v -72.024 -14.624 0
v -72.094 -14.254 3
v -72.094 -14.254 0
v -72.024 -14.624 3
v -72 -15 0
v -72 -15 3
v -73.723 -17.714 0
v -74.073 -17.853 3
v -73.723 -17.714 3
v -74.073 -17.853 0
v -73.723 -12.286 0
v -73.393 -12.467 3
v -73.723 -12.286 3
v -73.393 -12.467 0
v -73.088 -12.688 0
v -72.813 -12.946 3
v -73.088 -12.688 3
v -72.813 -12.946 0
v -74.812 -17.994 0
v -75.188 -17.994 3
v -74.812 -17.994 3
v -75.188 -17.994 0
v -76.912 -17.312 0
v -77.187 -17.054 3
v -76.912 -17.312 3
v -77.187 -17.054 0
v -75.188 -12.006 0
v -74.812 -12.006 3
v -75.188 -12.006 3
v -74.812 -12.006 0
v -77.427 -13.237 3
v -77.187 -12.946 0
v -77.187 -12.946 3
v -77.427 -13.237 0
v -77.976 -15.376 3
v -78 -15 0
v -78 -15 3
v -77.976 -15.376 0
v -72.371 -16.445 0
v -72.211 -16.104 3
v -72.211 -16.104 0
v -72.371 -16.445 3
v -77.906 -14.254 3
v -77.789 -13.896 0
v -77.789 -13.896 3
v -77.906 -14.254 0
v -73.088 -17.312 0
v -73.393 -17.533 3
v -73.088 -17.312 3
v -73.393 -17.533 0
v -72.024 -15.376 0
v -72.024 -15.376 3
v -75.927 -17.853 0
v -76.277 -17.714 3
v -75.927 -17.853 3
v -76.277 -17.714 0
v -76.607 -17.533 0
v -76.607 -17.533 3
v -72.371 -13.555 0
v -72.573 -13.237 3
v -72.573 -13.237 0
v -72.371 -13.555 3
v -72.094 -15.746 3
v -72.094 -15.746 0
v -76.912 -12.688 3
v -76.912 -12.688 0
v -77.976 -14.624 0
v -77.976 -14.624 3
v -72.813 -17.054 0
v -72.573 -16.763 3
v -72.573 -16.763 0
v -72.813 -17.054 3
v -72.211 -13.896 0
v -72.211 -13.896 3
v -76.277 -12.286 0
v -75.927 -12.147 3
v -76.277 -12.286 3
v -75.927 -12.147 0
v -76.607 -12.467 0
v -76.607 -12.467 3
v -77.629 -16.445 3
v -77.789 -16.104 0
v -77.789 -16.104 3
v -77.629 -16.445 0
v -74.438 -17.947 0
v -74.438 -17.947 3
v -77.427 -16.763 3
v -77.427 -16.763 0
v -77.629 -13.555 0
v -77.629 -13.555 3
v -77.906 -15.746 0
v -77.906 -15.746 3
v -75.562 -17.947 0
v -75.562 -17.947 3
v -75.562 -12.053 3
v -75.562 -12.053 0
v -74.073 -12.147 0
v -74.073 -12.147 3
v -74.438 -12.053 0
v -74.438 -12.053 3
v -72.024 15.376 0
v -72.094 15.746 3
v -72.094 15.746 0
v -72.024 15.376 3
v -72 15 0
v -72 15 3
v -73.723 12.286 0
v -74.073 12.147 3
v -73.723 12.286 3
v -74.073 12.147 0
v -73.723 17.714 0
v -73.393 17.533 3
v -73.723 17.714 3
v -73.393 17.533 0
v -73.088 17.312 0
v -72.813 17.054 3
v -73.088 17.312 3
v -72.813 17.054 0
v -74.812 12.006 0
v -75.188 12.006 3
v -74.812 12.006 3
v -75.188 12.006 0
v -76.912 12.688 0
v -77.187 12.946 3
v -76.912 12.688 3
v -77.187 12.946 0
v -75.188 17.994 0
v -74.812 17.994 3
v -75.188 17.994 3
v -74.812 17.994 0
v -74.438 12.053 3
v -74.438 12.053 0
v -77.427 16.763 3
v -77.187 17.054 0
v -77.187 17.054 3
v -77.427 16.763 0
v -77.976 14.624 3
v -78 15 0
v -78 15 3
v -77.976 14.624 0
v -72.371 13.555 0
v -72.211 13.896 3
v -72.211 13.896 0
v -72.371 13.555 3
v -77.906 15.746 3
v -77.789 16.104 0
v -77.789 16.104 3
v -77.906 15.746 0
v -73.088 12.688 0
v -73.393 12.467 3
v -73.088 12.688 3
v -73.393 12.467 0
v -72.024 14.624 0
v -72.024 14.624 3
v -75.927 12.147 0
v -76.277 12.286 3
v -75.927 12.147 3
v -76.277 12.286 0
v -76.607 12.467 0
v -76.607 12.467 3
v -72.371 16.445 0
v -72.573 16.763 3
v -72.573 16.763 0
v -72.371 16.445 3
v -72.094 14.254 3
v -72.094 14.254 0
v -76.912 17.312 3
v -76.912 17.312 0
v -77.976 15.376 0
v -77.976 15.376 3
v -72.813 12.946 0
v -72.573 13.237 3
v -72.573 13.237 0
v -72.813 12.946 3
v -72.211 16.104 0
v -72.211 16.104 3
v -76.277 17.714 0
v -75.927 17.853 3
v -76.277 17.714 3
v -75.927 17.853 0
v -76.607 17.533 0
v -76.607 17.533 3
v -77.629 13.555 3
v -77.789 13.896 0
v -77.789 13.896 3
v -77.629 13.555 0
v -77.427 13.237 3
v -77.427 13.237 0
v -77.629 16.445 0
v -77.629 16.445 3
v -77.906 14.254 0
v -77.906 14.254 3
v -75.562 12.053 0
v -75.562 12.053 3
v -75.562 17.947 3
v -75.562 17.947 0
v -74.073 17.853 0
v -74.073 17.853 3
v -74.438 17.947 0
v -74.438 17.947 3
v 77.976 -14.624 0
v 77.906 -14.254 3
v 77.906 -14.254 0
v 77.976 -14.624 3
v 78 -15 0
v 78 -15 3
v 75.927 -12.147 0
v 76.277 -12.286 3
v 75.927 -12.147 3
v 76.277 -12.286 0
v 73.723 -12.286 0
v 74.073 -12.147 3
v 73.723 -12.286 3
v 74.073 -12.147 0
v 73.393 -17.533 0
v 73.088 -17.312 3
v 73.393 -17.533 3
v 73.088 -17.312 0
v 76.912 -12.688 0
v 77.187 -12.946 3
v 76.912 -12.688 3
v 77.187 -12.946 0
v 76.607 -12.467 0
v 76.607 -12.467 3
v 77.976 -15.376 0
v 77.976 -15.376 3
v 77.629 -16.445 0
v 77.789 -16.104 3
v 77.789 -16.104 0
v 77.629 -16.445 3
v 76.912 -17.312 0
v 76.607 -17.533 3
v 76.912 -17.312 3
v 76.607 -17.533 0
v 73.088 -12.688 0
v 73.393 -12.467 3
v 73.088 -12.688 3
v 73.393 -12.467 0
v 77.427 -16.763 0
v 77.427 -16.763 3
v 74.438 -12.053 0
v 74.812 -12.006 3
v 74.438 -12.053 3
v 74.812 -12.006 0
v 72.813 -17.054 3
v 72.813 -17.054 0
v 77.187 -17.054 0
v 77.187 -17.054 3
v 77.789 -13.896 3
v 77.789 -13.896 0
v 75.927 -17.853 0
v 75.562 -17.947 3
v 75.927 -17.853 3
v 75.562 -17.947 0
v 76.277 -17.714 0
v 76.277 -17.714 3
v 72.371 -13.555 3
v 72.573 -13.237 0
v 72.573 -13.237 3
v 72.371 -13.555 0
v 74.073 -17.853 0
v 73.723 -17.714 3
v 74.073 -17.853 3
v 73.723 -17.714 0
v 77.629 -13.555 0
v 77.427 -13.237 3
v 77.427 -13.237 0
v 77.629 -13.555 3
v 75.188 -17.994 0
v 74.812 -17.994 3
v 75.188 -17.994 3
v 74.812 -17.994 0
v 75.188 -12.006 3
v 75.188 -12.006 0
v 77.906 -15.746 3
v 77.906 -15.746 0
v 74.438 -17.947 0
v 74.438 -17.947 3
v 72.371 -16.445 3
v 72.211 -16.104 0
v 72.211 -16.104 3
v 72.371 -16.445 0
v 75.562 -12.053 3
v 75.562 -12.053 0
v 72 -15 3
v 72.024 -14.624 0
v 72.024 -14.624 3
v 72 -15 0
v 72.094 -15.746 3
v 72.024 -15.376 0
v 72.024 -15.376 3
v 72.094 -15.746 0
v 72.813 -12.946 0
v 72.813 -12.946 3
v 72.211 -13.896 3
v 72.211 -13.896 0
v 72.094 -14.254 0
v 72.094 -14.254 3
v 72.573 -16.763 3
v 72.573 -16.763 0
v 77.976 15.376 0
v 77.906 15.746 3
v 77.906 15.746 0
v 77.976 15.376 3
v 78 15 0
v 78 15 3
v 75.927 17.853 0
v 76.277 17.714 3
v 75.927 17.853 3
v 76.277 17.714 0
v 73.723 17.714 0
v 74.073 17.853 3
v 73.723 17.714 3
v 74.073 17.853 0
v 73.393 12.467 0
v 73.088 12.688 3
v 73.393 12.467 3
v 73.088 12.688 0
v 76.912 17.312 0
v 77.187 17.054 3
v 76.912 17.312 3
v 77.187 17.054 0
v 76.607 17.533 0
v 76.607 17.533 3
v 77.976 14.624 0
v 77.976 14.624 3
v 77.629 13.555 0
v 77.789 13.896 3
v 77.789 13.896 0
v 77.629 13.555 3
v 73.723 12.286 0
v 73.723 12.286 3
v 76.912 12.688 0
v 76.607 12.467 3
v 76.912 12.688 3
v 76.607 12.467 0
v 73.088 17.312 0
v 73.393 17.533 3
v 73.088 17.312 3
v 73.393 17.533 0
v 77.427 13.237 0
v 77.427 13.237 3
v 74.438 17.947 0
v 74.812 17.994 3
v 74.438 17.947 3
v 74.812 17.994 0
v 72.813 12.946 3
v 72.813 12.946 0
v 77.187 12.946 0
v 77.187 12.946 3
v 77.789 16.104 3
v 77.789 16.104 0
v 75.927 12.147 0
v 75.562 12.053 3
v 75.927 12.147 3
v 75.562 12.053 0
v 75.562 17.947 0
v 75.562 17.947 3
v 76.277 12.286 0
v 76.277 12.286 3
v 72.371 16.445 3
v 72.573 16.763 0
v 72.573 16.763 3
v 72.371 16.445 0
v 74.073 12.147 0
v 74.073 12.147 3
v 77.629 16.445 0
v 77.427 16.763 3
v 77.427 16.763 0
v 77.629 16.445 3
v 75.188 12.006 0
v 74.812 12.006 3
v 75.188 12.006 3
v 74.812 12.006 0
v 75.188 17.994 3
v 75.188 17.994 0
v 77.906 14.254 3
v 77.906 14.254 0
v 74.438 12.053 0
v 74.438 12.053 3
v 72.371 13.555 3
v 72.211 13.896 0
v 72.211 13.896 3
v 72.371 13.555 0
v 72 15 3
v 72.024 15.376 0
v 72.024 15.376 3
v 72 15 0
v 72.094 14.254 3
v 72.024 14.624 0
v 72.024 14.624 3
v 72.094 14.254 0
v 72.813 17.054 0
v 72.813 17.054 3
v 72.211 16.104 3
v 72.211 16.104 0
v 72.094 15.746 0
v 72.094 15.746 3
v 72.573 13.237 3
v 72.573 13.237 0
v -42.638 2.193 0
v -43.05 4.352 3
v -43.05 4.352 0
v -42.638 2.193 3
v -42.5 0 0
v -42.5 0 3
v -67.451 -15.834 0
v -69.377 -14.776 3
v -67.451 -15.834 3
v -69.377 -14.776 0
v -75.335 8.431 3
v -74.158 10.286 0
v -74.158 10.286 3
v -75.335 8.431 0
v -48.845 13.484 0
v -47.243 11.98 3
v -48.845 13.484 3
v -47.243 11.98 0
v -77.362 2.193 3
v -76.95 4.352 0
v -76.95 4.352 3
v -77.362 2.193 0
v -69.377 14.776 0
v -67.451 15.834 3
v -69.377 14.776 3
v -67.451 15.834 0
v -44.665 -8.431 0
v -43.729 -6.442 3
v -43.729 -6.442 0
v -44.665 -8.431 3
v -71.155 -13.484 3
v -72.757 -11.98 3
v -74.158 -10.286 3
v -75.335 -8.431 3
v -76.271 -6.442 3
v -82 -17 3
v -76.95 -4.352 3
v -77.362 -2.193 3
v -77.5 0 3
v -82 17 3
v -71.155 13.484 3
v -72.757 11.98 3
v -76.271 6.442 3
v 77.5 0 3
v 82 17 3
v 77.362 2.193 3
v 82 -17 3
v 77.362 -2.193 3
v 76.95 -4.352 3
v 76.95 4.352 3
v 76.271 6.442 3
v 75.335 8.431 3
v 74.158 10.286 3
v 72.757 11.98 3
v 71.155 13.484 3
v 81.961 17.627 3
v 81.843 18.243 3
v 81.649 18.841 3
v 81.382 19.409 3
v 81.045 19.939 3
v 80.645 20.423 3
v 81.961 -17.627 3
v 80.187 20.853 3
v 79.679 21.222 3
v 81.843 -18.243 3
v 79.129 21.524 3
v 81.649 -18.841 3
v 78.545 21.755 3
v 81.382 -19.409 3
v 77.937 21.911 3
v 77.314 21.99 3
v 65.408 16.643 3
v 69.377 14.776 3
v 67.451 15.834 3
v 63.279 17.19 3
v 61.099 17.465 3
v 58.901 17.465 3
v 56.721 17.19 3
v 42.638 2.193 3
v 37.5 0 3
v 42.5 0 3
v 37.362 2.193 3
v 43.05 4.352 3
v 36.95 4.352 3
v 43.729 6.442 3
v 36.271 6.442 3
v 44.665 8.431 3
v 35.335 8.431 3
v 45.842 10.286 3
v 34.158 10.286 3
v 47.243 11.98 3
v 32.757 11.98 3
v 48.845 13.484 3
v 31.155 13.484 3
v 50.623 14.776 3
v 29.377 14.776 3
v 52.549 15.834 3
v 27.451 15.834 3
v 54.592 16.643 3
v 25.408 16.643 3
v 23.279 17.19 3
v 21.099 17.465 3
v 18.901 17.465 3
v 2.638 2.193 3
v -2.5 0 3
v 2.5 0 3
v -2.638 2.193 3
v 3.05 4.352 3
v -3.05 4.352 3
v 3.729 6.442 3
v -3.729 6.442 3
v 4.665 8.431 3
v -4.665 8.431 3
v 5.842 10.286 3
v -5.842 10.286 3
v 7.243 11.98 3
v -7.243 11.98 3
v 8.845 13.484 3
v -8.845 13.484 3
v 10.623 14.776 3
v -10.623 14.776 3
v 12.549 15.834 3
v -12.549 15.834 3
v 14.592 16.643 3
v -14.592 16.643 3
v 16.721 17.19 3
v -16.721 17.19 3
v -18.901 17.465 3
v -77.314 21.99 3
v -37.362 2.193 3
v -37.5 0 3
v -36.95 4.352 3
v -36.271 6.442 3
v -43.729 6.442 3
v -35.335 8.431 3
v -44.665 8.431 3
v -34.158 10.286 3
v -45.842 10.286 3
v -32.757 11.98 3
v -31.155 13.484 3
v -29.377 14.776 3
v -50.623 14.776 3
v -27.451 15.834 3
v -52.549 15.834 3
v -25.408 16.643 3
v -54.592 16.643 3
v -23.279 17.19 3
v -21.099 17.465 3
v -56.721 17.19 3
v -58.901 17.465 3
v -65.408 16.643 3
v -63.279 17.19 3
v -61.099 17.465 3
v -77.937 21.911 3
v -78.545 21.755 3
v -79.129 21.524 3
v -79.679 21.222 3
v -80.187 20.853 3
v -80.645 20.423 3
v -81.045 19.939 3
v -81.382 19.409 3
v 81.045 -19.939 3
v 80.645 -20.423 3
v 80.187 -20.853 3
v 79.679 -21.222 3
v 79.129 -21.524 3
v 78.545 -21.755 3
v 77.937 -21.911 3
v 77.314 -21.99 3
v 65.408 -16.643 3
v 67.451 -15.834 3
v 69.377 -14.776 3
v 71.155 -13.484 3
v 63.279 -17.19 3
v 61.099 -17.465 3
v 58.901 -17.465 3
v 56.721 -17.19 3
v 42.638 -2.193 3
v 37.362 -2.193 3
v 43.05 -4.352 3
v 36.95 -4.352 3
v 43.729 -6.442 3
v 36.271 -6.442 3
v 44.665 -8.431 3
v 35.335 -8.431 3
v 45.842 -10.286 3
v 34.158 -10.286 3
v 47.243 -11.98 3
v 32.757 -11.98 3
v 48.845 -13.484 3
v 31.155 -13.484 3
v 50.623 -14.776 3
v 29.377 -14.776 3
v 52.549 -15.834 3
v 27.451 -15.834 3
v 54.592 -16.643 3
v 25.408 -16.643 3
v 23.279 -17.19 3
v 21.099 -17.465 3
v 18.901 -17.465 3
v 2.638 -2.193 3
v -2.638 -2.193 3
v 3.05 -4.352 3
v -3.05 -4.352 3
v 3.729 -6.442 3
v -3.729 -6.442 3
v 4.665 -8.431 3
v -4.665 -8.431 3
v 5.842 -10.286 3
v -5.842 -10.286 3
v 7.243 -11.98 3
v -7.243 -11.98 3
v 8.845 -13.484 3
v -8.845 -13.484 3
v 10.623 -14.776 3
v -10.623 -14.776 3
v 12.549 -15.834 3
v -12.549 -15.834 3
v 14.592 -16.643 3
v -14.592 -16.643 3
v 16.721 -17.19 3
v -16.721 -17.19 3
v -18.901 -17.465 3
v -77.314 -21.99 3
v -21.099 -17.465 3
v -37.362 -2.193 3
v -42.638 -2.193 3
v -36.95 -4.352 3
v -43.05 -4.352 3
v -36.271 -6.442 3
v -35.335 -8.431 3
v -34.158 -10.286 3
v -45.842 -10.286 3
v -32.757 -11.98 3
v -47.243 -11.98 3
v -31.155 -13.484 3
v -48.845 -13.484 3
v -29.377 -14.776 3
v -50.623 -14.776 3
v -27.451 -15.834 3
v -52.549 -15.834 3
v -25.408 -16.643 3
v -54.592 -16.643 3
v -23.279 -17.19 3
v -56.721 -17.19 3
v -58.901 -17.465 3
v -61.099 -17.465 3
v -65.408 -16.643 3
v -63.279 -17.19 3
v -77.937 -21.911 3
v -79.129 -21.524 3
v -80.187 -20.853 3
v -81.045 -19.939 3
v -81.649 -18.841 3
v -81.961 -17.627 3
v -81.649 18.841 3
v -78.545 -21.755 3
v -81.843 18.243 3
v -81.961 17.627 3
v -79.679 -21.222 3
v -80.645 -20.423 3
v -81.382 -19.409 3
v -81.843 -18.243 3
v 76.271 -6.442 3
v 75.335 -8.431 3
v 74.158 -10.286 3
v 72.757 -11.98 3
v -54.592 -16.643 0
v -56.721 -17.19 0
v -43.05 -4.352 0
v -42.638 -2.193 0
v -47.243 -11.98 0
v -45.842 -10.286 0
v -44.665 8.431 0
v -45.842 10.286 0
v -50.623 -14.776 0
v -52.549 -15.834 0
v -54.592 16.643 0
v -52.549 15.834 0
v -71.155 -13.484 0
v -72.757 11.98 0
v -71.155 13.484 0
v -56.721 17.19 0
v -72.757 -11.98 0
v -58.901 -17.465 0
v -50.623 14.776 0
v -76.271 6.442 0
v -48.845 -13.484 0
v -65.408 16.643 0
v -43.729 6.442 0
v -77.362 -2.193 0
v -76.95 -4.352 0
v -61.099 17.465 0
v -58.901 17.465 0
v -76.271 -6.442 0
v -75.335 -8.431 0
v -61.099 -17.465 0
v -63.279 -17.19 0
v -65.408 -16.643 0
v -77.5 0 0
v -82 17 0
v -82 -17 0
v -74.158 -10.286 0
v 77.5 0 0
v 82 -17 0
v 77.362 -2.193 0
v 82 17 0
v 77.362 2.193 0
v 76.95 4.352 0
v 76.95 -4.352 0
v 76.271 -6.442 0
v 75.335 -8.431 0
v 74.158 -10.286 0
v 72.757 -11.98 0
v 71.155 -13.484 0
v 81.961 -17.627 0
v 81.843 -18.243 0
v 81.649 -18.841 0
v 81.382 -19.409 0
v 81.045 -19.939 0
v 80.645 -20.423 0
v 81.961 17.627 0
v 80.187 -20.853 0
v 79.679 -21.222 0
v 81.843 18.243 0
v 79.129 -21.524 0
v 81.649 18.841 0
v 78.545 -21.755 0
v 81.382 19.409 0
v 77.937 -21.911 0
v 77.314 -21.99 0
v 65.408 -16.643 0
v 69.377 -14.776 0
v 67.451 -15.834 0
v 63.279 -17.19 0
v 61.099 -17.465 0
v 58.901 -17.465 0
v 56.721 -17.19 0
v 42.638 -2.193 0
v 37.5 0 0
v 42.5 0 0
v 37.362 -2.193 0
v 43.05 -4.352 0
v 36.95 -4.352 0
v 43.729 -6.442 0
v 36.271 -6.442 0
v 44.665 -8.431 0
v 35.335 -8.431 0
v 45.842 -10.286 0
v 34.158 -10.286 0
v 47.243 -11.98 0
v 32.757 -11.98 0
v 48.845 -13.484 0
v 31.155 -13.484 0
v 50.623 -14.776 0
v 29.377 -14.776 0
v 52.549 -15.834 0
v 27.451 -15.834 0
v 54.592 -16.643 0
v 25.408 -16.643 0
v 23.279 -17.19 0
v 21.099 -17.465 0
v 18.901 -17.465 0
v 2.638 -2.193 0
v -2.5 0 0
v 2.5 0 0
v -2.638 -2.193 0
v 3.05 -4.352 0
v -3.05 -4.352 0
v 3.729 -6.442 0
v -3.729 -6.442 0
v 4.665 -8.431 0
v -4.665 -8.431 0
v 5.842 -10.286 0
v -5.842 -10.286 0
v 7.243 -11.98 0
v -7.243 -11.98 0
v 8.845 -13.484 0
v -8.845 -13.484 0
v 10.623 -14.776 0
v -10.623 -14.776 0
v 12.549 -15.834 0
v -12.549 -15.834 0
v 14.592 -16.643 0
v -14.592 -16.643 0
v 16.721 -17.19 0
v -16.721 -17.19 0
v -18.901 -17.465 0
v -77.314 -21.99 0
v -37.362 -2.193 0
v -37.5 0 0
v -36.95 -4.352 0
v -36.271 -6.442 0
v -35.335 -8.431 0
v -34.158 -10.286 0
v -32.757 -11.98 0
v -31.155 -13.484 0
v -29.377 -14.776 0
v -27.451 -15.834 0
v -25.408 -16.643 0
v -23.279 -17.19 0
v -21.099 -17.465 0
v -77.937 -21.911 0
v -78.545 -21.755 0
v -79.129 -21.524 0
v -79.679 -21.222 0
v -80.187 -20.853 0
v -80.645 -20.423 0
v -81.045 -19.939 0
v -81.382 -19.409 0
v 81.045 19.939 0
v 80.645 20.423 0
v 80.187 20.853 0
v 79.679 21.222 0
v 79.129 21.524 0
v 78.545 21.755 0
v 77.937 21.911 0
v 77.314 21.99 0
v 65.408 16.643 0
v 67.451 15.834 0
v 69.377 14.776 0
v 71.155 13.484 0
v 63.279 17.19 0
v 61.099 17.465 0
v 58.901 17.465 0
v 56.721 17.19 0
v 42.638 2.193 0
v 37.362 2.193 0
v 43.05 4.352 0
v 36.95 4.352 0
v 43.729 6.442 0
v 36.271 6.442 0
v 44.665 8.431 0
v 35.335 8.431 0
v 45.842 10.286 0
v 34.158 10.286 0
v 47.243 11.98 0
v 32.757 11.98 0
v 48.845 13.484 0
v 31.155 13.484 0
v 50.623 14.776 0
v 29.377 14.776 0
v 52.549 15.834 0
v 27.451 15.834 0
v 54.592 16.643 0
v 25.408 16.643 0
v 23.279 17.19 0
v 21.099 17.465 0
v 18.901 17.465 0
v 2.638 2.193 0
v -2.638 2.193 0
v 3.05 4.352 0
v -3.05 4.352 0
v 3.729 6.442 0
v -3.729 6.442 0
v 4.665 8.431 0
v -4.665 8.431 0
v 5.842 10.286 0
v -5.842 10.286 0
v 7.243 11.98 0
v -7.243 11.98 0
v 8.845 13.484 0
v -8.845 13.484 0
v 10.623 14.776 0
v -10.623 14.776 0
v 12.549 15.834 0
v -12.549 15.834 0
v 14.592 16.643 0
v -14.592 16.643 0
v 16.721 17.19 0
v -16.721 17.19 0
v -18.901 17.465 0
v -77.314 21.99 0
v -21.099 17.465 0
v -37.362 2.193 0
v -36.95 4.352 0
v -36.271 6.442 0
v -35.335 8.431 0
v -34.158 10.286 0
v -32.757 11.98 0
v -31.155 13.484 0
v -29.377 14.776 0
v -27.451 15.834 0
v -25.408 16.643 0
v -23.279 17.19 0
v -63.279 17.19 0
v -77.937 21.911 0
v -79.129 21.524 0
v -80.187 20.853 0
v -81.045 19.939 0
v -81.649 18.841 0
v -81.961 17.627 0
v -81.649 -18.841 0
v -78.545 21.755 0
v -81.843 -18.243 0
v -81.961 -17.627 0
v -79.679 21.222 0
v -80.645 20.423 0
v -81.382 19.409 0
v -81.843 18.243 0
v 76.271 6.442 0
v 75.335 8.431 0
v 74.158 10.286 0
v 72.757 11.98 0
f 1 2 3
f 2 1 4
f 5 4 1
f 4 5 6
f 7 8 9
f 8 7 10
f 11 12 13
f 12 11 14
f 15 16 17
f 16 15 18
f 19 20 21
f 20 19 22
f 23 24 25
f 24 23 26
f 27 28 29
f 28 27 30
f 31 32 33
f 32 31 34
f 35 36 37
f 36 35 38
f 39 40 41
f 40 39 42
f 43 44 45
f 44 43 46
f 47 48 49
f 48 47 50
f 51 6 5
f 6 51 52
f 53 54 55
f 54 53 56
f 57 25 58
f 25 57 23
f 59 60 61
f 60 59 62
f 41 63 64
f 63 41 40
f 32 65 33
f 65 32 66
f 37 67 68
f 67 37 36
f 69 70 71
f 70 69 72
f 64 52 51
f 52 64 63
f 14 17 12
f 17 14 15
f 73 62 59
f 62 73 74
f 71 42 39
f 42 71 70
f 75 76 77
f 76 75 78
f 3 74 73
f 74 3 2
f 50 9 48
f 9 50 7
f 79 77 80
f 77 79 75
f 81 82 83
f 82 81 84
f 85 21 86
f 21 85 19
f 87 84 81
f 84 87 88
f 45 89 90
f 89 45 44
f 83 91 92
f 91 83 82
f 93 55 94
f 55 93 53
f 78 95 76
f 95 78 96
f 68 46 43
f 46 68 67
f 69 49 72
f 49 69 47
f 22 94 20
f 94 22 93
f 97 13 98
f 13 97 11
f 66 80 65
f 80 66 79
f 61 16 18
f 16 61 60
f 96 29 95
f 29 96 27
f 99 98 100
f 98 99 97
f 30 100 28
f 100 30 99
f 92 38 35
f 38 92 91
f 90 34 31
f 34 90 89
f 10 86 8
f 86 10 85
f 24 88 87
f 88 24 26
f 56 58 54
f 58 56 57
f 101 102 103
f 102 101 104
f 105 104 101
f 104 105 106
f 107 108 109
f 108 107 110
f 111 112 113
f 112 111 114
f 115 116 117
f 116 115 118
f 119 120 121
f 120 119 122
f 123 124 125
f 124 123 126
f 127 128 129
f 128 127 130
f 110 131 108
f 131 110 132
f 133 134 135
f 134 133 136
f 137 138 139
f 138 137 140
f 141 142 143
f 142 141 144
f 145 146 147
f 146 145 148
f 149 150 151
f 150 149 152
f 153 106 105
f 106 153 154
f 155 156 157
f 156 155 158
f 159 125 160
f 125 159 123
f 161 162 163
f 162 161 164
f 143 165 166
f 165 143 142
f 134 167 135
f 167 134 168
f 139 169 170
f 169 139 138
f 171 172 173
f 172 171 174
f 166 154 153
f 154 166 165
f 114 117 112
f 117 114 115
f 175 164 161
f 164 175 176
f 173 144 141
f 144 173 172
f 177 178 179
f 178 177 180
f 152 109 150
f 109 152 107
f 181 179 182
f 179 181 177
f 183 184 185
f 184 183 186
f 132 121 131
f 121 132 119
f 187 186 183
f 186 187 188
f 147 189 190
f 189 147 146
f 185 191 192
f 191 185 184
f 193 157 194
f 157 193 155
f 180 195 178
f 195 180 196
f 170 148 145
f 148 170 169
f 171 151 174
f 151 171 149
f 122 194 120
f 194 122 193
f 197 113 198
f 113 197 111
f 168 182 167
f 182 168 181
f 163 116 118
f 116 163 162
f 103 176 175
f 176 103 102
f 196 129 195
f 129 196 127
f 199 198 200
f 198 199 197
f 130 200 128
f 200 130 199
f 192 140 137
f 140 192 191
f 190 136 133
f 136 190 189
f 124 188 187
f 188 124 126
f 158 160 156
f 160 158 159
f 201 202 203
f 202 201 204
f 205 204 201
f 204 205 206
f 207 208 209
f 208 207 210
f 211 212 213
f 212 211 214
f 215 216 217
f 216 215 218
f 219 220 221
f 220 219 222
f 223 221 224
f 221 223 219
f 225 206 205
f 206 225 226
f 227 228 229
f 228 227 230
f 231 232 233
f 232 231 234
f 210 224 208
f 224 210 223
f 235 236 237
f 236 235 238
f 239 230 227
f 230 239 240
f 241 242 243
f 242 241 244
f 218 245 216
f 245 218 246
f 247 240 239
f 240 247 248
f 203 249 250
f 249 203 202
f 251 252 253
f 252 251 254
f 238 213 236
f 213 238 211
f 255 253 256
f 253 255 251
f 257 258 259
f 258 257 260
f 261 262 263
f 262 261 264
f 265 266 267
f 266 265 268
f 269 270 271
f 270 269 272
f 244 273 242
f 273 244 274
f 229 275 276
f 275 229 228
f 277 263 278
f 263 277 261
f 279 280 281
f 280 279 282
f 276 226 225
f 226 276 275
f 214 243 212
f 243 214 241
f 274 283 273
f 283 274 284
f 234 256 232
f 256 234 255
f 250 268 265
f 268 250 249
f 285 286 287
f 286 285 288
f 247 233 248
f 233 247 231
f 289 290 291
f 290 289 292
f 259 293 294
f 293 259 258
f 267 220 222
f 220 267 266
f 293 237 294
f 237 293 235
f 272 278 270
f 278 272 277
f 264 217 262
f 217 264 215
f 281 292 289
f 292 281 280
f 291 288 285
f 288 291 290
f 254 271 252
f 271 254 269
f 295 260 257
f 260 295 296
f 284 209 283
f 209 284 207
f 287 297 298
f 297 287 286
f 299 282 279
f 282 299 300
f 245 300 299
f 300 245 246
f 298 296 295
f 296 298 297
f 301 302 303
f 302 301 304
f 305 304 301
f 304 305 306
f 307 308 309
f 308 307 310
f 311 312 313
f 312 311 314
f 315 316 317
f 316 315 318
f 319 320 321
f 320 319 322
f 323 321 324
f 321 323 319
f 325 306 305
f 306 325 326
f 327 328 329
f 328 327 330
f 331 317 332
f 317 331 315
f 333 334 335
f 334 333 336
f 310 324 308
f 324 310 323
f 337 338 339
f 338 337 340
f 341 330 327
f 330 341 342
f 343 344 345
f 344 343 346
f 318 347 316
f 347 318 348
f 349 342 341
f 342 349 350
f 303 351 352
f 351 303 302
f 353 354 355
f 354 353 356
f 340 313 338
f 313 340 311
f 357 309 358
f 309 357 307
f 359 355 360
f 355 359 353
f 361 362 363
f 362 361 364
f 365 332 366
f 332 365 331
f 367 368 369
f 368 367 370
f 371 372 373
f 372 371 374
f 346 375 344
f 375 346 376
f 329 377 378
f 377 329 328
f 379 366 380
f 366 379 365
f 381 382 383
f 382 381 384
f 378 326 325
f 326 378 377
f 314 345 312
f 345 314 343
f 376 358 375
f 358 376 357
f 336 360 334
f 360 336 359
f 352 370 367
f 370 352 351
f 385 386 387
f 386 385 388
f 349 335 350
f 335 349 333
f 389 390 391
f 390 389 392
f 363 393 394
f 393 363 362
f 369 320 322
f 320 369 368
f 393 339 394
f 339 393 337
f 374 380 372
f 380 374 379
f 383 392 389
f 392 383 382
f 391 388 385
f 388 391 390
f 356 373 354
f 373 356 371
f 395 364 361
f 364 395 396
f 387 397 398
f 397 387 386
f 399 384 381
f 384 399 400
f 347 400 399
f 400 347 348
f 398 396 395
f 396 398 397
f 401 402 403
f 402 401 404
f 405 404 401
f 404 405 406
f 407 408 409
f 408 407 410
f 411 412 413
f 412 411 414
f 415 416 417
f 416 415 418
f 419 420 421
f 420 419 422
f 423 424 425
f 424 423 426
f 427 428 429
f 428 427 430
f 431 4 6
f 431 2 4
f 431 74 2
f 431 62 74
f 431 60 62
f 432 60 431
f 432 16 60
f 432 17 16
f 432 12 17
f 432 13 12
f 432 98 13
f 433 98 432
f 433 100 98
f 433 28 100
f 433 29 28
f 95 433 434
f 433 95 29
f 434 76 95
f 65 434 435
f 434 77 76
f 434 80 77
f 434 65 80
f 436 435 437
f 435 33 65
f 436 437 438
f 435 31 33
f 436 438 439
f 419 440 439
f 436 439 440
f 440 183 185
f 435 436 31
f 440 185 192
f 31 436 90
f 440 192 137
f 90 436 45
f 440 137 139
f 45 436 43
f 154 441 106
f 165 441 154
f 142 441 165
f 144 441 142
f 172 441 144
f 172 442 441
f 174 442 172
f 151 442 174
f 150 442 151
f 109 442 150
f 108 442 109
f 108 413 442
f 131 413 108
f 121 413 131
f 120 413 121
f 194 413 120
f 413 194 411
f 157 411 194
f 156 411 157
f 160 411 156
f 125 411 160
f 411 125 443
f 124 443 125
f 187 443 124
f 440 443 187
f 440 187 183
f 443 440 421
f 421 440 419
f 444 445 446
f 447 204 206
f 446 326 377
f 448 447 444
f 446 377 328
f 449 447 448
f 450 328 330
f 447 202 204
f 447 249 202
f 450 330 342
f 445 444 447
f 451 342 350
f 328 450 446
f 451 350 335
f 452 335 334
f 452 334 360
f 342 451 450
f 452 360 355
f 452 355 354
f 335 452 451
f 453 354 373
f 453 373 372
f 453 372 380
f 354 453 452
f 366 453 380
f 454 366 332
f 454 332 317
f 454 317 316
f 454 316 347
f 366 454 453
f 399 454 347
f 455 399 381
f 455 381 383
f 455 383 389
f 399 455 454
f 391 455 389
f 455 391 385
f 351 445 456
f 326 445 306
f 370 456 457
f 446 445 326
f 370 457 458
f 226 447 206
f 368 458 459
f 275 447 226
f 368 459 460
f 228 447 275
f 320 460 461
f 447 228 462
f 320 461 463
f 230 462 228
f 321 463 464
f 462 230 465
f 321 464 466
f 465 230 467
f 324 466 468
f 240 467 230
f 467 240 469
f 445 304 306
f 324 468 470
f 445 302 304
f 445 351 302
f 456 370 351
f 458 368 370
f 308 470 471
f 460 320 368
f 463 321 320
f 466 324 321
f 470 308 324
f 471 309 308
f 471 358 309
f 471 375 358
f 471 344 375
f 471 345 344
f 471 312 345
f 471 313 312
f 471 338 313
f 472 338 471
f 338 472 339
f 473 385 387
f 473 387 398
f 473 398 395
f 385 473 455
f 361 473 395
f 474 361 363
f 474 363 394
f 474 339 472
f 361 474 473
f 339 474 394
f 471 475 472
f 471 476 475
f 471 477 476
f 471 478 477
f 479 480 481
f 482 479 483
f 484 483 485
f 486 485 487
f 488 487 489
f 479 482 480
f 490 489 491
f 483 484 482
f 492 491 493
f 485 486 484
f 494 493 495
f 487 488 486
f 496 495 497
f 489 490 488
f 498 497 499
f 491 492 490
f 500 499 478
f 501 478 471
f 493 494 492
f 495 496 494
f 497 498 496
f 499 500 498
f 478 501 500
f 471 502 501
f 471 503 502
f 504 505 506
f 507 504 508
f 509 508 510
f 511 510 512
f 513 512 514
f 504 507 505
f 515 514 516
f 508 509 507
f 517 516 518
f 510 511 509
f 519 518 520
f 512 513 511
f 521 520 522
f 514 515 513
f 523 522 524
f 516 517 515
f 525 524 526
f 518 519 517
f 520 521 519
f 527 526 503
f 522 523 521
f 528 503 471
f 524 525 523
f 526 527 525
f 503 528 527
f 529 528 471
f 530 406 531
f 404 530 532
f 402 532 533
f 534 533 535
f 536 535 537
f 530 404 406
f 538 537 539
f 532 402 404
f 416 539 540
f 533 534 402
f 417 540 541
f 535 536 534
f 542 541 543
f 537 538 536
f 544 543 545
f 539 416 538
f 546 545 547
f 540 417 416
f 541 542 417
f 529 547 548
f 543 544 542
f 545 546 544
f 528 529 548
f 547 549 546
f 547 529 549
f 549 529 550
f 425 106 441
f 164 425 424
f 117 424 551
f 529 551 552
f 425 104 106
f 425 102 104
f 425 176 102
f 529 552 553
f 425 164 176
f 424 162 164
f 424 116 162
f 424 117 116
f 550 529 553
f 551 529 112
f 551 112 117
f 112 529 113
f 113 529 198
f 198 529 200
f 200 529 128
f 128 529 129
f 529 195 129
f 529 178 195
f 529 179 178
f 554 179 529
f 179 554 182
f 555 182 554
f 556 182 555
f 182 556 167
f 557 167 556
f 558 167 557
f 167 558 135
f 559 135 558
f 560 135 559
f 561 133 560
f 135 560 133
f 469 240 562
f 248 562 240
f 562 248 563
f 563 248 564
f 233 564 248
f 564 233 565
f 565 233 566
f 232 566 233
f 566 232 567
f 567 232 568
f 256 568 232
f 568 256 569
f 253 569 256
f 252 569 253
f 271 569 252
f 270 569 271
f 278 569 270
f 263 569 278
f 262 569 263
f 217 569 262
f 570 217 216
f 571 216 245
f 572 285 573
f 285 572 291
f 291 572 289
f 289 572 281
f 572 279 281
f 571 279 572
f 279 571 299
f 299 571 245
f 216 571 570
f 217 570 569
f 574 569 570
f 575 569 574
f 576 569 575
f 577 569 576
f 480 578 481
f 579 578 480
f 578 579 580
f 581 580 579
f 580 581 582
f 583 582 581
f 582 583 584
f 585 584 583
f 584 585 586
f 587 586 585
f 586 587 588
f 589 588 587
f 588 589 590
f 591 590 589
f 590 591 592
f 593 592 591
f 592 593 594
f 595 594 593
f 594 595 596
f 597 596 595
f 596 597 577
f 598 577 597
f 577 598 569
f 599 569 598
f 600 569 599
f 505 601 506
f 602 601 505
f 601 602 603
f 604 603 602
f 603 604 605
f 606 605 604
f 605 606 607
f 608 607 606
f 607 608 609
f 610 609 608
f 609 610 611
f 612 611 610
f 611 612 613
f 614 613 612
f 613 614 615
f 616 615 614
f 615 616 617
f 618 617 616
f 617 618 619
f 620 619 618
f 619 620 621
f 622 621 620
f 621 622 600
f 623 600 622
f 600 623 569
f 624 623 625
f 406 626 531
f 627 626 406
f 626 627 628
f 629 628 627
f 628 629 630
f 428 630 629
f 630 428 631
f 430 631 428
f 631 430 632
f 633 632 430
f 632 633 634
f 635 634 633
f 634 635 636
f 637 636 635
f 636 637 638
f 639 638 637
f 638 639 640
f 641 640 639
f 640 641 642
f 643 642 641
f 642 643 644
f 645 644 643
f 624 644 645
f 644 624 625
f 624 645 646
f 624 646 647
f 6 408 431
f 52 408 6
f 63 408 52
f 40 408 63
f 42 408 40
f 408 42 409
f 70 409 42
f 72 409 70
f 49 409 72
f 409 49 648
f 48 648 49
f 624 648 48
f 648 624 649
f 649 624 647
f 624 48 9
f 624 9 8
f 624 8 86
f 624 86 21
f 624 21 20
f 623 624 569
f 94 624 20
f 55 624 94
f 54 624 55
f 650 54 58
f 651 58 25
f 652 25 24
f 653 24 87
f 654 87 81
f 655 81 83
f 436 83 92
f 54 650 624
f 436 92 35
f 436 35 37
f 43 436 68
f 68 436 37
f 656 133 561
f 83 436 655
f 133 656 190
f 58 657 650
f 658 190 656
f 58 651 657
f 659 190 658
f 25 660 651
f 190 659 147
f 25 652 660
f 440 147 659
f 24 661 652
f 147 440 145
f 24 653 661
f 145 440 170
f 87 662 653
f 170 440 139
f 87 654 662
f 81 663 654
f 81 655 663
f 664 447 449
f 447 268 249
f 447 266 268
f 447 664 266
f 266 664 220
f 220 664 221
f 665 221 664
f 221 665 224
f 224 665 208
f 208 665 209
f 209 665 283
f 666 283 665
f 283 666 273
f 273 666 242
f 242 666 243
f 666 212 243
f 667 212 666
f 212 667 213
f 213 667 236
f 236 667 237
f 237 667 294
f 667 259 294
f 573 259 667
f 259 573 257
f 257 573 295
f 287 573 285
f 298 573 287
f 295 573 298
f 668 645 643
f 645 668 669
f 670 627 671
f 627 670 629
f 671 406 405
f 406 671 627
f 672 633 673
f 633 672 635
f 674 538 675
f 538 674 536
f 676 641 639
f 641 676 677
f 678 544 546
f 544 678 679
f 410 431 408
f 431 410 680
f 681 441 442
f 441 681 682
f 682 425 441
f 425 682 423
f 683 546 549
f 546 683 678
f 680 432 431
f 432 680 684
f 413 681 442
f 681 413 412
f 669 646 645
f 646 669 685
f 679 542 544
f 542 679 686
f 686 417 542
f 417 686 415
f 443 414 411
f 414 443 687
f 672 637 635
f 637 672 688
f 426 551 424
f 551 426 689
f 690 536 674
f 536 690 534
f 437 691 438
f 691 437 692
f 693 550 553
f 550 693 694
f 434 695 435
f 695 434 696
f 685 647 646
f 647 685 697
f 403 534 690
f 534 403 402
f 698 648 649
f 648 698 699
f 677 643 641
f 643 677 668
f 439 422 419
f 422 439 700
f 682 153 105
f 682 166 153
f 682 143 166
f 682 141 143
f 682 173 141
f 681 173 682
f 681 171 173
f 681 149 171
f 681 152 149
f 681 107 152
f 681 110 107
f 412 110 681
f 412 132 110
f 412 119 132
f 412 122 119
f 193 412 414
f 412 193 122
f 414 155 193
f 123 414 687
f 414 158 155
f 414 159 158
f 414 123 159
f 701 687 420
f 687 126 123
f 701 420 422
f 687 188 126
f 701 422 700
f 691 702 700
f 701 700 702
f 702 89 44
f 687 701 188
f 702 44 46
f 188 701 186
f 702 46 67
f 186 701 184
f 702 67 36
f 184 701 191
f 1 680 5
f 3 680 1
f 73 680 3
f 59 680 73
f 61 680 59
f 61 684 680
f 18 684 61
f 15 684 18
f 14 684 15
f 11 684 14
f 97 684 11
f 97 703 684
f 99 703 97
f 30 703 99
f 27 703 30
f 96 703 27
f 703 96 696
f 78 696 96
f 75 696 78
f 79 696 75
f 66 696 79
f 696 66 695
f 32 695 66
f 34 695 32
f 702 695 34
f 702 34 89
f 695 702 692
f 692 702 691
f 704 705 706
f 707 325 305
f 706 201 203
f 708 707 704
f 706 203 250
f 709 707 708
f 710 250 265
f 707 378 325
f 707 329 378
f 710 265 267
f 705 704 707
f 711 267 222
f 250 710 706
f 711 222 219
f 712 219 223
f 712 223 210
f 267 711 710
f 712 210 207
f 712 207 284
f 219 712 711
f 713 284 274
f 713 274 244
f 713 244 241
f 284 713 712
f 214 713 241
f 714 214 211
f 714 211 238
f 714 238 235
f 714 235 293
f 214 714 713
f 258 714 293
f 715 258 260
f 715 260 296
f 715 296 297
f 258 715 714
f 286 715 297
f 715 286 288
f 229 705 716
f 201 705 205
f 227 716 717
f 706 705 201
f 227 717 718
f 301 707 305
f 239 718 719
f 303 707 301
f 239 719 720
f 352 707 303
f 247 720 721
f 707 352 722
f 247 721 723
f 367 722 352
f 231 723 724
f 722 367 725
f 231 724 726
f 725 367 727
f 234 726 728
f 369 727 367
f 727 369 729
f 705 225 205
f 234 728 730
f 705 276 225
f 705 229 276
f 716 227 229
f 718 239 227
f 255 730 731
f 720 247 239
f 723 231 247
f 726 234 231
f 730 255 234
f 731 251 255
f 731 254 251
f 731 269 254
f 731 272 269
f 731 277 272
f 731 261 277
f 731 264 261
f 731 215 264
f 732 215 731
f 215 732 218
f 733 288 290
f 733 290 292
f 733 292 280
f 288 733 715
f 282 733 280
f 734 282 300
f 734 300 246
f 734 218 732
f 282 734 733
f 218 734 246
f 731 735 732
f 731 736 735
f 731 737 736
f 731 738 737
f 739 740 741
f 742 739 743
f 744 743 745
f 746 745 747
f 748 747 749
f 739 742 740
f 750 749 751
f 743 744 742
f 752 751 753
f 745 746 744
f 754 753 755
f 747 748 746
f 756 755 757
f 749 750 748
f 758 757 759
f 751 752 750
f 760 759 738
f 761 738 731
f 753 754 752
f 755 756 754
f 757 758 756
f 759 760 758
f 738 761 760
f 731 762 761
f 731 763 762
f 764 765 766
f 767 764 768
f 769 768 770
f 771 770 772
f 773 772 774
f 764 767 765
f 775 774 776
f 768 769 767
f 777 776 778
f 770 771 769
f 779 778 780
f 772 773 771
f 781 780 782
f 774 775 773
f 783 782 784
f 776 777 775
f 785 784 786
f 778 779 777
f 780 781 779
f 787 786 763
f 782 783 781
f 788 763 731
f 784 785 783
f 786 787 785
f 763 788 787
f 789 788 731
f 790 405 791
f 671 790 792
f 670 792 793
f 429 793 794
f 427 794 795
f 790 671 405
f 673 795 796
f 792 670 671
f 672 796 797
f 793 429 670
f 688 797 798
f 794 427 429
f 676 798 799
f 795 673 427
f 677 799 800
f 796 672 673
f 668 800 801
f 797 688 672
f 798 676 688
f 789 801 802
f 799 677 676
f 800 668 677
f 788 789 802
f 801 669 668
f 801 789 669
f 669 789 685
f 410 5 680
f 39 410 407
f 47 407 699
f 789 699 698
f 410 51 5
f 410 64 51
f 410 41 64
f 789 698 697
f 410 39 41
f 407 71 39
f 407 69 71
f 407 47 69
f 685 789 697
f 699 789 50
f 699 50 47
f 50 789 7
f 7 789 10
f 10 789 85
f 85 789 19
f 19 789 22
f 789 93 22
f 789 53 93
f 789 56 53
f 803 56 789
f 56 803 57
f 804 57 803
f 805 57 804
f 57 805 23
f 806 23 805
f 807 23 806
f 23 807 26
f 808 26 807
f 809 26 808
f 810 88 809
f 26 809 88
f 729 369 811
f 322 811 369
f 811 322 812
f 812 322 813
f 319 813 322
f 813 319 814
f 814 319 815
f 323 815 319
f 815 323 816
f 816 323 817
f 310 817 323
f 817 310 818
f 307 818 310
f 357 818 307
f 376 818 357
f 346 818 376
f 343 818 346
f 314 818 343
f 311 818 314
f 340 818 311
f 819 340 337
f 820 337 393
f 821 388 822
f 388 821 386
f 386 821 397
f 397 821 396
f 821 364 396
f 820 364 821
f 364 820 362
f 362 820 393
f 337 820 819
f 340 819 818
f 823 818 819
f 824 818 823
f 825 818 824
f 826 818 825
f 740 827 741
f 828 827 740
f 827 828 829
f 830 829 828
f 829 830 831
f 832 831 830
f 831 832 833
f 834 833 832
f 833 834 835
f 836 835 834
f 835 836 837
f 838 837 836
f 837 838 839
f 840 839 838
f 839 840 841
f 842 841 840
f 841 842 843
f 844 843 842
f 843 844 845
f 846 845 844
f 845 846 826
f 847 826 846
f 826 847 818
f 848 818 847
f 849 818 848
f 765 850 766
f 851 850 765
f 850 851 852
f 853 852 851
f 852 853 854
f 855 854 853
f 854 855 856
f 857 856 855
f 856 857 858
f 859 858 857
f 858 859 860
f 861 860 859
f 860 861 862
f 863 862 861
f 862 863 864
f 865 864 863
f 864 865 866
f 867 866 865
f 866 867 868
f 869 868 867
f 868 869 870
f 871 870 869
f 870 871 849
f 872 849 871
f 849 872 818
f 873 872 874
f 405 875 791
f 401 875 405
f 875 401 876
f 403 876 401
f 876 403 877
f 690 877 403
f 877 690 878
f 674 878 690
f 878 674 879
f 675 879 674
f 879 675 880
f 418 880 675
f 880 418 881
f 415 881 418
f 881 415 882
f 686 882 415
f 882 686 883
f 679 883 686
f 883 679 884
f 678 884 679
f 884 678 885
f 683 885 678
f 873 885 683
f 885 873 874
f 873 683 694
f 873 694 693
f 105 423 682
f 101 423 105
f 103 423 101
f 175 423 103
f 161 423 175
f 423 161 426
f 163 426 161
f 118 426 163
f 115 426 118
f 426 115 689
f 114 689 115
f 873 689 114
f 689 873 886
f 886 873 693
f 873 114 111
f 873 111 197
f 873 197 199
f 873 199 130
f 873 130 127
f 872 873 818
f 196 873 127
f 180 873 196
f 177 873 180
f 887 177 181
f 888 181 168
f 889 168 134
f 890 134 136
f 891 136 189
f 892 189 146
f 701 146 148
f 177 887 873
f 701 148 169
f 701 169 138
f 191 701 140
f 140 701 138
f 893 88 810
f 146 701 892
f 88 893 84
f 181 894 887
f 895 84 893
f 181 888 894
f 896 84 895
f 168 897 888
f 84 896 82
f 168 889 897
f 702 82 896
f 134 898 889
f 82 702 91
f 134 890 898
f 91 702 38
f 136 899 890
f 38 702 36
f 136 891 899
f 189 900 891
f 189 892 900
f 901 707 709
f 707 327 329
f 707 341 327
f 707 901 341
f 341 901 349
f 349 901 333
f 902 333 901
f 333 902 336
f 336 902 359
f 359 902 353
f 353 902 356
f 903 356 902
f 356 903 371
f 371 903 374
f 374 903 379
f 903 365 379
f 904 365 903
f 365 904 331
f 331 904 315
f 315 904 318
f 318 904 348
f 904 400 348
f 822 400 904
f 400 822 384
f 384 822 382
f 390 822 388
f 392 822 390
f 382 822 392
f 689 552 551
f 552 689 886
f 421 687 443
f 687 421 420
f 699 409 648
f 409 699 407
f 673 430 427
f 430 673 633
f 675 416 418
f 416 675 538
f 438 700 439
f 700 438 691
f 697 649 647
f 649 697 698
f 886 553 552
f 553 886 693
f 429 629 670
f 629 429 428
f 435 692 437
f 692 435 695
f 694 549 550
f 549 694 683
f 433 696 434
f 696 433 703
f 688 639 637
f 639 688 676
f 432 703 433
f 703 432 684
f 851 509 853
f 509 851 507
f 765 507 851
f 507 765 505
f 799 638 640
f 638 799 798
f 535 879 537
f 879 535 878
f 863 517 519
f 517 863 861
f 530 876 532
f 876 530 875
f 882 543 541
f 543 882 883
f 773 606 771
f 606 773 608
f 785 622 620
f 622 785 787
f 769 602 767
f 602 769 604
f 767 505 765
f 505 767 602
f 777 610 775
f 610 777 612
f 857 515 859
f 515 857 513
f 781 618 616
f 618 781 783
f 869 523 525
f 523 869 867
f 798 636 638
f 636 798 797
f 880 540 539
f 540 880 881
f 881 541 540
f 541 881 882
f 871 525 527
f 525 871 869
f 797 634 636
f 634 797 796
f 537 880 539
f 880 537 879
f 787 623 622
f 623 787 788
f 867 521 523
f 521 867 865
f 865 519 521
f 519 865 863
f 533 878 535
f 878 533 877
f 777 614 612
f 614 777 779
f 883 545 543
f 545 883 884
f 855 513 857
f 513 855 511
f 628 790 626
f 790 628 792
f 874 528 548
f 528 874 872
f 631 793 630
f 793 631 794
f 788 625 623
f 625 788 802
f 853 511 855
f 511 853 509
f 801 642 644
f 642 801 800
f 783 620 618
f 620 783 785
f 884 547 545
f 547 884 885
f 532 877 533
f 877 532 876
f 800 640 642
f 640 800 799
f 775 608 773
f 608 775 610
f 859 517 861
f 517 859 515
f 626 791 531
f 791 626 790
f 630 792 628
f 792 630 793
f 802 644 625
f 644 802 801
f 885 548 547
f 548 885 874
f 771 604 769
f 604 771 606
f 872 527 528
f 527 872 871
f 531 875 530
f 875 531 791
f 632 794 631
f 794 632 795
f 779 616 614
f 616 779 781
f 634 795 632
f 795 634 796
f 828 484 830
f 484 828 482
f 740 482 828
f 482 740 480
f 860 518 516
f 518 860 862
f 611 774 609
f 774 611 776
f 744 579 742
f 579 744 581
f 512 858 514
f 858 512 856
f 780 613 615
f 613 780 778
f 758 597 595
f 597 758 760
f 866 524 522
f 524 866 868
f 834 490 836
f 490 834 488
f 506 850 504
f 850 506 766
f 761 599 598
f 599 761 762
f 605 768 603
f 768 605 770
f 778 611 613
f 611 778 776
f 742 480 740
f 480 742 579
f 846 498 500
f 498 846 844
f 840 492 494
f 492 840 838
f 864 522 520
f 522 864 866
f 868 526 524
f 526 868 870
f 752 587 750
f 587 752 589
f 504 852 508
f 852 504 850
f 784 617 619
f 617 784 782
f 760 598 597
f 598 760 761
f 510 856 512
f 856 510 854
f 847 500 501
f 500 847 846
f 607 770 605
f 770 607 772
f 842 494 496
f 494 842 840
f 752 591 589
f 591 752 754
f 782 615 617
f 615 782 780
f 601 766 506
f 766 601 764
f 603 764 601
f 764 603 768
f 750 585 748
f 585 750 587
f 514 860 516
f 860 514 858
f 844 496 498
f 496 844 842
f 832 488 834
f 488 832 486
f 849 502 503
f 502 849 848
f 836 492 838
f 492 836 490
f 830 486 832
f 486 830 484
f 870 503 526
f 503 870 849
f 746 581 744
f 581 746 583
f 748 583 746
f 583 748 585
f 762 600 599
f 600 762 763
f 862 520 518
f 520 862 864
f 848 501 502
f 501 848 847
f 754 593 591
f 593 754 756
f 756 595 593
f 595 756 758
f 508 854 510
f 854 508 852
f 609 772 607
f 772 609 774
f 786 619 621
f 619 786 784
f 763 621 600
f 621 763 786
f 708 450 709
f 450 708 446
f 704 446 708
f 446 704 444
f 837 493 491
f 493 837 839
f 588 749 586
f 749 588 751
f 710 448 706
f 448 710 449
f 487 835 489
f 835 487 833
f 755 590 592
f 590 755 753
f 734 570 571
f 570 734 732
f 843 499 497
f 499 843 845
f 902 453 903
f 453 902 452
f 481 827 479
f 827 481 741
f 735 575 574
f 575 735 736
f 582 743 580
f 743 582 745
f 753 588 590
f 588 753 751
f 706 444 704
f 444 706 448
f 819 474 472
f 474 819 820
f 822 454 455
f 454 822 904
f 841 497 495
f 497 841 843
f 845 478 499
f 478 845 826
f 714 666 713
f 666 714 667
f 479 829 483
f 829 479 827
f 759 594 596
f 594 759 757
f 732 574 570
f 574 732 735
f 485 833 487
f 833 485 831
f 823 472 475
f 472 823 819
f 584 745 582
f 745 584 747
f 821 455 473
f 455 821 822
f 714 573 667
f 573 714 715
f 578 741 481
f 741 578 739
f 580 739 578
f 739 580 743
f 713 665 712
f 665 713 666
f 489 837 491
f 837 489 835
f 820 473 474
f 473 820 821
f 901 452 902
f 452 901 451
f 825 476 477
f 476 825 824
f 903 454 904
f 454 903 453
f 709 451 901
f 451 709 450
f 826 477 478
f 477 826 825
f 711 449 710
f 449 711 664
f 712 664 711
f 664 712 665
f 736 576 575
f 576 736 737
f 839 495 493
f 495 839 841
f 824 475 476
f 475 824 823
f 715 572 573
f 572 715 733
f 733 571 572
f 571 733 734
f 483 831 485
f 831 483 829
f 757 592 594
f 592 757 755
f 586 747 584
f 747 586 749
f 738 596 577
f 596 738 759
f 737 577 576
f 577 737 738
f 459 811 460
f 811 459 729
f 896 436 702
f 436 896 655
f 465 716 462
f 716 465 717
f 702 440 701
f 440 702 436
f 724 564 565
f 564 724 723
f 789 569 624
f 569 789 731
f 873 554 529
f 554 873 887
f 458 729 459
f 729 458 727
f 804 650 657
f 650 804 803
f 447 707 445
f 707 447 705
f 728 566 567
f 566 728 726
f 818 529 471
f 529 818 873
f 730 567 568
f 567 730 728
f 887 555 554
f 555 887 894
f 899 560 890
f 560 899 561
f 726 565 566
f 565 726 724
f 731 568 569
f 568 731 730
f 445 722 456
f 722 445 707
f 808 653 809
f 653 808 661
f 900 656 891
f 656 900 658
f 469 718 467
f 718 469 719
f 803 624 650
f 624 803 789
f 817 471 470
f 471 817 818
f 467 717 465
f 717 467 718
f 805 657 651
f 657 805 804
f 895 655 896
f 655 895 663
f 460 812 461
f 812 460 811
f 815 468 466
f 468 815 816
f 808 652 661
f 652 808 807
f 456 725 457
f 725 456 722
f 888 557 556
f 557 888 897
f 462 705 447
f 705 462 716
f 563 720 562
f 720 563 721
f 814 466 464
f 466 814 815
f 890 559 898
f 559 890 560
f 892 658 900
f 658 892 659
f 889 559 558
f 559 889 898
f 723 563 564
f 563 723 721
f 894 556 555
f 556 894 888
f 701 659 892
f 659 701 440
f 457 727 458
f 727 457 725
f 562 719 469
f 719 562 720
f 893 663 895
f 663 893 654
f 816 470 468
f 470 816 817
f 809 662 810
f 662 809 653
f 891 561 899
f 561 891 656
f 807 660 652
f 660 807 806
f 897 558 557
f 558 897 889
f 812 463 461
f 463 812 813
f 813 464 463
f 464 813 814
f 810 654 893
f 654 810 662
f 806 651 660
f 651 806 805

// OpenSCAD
$fn = 50;


difference() {
	union() {
		hull() {
			translate(v = [-77.0000000000, 17.0000000000, 0]) {
				cylinder(h = 3, r = 5);
			}
			translate(v = [77.0000000000, 17.0000000000, 0]) {
				cylinder(h = 3, r = 5);
			}
			translate(v = [-77.0000000000, -17.0000000000, 0]) {
				cylinder(h = 3, r = 5);
			}
			translate(v = [77.0000000000, -17.0000000000, 0]) {
				cylinder(h = 3, r = 5);
			}
		}
	}
	union() {
		#translate(v = [-75.0000000000, -15.0000000000, -100.0000000000]) {
			cylinder(h = 200, r = 3.0000000000);
		}
		#translate(v = [-75.0000000000, 15.0000000000, -100.0000000000]) {
			cylinder(h = 200, r = 3.0000000000);
		}
		#translate(v = [75.0000000000, -15.0000000000, -100.0000000000]) {
			cylinder(h = 200, r = 3.0000000000);
		}
		#translate(v = [75.0000000000, 15.0000000000, -100.0000000000]) {
			cylinder(h = 200, r = 3.0000000000);
		}
		#translate(v = [-60.0000000000, 0, 0]) {
			cylinder(h = 3, r = 17.5000000000);
		}
		#translate(v = [-20.0000000000, 0, 0]) {
			cylinder(h = 3, r = 17.5000000000);
		}
		#translate(v = [20.0000000000, 0, 0]) {
			cylinder(h = 3, r = 17.5000000000);
		}
		#translate(v = [60.0000000000, 0, 0]) {
			cylinder(h = 3, r = 17.5000000000);
		}
	}
}
